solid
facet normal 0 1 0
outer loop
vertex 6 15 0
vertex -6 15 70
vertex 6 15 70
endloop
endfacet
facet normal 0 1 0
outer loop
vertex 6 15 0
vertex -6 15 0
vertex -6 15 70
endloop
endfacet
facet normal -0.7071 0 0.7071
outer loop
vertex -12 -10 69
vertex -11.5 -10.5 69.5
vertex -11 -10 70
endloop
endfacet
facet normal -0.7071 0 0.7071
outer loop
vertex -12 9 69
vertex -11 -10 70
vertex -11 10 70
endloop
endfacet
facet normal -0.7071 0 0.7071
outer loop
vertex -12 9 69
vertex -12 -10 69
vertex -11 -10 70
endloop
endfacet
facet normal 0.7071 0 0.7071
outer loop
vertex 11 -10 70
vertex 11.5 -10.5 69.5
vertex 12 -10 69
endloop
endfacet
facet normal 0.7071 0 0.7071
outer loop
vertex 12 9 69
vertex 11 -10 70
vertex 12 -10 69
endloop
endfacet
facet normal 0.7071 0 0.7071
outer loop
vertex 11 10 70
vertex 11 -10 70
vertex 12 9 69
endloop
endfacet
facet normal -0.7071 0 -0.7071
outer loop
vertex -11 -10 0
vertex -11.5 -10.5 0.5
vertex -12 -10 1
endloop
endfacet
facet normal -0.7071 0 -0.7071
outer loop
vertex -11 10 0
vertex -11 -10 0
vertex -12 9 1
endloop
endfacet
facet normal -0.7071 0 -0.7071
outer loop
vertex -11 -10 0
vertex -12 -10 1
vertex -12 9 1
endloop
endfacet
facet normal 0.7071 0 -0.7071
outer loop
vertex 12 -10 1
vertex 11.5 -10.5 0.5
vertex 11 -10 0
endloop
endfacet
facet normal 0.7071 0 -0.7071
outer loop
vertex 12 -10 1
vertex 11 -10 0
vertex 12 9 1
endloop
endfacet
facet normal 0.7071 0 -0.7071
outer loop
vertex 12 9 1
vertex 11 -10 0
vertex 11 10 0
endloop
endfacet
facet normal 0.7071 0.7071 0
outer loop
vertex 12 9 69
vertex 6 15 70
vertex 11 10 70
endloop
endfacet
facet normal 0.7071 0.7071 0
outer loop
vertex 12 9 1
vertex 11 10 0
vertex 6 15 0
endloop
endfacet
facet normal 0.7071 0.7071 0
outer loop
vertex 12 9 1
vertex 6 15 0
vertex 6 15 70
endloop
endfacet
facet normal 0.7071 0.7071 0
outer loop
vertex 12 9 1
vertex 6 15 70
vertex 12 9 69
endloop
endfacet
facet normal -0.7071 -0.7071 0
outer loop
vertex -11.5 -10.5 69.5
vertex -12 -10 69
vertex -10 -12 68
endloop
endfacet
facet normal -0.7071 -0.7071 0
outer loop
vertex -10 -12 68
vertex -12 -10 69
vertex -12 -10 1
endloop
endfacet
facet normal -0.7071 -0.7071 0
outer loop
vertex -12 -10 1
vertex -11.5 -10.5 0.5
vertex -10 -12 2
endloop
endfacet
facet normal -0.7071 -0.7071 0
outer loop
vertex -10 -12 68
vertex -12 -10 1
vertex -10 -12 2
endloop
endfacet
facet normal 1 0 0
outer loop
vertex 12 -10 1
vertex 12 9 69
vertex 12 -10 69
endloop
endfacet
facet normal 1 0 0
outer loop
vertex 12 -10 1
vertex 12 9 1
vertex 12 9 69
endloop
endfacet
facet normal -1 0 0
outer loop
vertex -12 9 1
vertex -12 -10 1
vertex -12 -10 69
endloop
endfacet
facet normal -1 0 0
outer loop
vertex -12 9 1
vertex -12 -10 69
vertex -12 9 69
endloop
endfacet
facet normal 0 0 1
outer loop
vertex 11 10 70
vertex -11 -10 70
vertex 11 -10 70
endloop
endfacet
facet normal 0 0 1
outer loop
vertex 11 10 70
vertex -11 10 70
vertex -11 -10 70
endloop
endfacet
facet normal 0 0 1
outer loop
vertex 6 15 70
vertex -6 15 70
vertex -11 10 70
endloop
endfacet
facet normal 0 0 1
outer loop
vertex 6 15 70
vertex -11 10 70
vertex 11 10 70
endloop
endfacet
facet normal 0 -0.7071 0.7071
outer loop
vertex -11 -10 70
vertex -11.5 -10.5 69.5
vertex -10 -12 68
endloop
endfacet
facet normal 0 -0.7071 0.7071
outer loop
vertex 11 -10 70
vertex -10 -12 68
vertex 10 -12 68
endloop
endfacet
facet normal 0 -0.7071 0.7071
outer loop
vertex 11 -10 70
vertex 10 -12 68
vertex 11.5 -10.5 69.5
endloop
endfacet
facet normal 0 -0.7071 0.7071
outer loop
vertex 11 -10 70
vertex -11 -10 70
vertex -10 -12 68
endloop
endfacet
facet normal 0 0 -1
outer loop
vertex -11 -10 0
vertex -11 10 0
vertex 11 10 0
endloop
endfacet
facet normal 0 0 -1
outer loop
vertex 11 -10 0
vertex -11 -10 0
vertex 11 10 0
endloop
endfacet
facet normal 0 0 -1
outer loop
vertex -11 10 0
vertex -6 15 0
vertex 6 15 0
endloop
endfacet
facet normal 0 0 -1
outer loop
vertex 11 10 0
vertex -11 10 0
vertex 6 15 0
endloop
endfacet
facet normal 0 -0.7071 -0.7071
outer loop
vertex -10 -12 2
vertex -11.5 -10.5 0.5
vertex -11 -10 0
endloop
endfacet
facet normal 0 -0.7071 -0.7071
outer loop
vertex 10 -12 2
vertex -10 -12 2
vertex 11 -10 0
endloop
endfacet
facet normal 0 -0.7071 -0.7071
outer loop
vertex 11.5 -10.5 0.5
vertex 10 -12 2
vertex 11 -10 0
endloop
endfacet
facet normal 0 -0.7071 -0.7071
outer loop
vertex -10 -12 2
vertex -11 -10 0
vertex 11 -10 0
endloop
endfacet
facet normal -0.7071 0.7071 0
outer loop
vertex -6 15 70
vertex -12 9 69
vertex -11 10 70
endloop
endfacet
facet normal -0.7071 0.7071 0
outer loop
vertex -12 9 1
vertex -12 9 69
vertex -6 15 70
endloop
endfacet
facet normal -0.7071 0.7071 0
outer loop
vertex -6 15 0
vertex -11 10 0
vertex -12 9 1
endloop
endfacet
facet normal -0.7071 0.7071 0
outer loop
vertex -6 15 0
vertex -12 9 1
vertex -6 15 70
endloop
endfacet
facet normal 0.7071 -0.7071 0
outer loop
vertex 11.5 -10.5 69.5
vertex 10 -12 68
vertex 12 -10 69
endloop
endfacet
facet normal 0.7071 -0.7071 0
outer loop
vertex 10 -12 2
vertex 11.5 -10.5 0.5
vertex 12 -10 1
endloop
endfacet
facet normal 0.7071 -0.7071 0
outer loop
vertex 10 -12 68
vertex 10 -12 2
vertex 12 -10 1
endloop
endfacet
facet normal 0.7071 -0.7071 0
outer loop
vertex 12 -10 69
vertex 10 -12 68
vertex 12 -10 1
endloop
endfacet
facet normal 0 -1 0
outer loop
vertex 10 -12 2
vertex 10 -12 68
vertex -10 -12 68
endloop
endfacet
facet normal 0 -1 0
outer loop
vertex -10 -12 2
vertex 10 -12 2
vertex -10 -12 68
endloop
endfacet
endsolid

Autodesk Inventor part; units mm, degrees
ref_plane "YZ Plane" through (0, 0, 0) normal (1, 0, 0) x (0, 1, 0)
ref_plane "XZ Plane" through (0, 0, 0) normal (0, 1, 0) x (-1, 0, 0)
ref_plane "XY Plane" through (0, 0, 0) normal (0, 0, 1) x (1, 0, 0)
sketch "Sketch1" plane through (0, 0, 0) normal (0, 0, 1) x (1, 0, 0)
  line L0 (-6, 15) -> (6, 15)
  line L1 (12, 9) -> (12, -10)
  line L2 (10, -12) -> (-10, -12)
  line L3 (-12, -10) -> (-12, 9)
  line L4 (-12, 9) -> (-6, 15)
  line L5 (6, 15) -> (12, 9)
  line L6 (-12, -10) -> (-10, -12)
  line L7 (10, -12) -> (12, -10)
  point P0 (0, 0)
  point P1 (-12, 15)
  point P2 (12, -12)
  point P3 (12, 15)
  point P4 (-12, -12)
  dimension "d0" = 24
  dimension "d1" = 27
  dimension "d2" = 12
  dimension "d3" = 12
  dimension "d4" = 6
  dimension "d5" = 6
  dimension "d6" = 6
  dimension "d7" = 6
  dimension "d8" = 2
  dimension "d9" = 2
  dimension "d10" = 2
  dimension "d11" = 2
extrude "Extrusion1" add sketch "Sketch1" along normal blind 70
chamfer "Chamfer1" distance 2 angle 45 2 edges at (0, -12, 70) (0, -12, 0)
chamfer "Chamfer2" distance 1 angle 45 4 edges at (12, -0.5, 0) (-12, -0.5, 0) (-12, -0.5, 70) (12, -0.5, 70)
equation "\"d5\" = d4"
equation "\"d6\" = d4"
equation "\"d7\" = d6"
equation "\"d9\" = d8"
equation "\"d10\" = d8"
equation "\"d11\" = d10"
properties part number "battery_box"
